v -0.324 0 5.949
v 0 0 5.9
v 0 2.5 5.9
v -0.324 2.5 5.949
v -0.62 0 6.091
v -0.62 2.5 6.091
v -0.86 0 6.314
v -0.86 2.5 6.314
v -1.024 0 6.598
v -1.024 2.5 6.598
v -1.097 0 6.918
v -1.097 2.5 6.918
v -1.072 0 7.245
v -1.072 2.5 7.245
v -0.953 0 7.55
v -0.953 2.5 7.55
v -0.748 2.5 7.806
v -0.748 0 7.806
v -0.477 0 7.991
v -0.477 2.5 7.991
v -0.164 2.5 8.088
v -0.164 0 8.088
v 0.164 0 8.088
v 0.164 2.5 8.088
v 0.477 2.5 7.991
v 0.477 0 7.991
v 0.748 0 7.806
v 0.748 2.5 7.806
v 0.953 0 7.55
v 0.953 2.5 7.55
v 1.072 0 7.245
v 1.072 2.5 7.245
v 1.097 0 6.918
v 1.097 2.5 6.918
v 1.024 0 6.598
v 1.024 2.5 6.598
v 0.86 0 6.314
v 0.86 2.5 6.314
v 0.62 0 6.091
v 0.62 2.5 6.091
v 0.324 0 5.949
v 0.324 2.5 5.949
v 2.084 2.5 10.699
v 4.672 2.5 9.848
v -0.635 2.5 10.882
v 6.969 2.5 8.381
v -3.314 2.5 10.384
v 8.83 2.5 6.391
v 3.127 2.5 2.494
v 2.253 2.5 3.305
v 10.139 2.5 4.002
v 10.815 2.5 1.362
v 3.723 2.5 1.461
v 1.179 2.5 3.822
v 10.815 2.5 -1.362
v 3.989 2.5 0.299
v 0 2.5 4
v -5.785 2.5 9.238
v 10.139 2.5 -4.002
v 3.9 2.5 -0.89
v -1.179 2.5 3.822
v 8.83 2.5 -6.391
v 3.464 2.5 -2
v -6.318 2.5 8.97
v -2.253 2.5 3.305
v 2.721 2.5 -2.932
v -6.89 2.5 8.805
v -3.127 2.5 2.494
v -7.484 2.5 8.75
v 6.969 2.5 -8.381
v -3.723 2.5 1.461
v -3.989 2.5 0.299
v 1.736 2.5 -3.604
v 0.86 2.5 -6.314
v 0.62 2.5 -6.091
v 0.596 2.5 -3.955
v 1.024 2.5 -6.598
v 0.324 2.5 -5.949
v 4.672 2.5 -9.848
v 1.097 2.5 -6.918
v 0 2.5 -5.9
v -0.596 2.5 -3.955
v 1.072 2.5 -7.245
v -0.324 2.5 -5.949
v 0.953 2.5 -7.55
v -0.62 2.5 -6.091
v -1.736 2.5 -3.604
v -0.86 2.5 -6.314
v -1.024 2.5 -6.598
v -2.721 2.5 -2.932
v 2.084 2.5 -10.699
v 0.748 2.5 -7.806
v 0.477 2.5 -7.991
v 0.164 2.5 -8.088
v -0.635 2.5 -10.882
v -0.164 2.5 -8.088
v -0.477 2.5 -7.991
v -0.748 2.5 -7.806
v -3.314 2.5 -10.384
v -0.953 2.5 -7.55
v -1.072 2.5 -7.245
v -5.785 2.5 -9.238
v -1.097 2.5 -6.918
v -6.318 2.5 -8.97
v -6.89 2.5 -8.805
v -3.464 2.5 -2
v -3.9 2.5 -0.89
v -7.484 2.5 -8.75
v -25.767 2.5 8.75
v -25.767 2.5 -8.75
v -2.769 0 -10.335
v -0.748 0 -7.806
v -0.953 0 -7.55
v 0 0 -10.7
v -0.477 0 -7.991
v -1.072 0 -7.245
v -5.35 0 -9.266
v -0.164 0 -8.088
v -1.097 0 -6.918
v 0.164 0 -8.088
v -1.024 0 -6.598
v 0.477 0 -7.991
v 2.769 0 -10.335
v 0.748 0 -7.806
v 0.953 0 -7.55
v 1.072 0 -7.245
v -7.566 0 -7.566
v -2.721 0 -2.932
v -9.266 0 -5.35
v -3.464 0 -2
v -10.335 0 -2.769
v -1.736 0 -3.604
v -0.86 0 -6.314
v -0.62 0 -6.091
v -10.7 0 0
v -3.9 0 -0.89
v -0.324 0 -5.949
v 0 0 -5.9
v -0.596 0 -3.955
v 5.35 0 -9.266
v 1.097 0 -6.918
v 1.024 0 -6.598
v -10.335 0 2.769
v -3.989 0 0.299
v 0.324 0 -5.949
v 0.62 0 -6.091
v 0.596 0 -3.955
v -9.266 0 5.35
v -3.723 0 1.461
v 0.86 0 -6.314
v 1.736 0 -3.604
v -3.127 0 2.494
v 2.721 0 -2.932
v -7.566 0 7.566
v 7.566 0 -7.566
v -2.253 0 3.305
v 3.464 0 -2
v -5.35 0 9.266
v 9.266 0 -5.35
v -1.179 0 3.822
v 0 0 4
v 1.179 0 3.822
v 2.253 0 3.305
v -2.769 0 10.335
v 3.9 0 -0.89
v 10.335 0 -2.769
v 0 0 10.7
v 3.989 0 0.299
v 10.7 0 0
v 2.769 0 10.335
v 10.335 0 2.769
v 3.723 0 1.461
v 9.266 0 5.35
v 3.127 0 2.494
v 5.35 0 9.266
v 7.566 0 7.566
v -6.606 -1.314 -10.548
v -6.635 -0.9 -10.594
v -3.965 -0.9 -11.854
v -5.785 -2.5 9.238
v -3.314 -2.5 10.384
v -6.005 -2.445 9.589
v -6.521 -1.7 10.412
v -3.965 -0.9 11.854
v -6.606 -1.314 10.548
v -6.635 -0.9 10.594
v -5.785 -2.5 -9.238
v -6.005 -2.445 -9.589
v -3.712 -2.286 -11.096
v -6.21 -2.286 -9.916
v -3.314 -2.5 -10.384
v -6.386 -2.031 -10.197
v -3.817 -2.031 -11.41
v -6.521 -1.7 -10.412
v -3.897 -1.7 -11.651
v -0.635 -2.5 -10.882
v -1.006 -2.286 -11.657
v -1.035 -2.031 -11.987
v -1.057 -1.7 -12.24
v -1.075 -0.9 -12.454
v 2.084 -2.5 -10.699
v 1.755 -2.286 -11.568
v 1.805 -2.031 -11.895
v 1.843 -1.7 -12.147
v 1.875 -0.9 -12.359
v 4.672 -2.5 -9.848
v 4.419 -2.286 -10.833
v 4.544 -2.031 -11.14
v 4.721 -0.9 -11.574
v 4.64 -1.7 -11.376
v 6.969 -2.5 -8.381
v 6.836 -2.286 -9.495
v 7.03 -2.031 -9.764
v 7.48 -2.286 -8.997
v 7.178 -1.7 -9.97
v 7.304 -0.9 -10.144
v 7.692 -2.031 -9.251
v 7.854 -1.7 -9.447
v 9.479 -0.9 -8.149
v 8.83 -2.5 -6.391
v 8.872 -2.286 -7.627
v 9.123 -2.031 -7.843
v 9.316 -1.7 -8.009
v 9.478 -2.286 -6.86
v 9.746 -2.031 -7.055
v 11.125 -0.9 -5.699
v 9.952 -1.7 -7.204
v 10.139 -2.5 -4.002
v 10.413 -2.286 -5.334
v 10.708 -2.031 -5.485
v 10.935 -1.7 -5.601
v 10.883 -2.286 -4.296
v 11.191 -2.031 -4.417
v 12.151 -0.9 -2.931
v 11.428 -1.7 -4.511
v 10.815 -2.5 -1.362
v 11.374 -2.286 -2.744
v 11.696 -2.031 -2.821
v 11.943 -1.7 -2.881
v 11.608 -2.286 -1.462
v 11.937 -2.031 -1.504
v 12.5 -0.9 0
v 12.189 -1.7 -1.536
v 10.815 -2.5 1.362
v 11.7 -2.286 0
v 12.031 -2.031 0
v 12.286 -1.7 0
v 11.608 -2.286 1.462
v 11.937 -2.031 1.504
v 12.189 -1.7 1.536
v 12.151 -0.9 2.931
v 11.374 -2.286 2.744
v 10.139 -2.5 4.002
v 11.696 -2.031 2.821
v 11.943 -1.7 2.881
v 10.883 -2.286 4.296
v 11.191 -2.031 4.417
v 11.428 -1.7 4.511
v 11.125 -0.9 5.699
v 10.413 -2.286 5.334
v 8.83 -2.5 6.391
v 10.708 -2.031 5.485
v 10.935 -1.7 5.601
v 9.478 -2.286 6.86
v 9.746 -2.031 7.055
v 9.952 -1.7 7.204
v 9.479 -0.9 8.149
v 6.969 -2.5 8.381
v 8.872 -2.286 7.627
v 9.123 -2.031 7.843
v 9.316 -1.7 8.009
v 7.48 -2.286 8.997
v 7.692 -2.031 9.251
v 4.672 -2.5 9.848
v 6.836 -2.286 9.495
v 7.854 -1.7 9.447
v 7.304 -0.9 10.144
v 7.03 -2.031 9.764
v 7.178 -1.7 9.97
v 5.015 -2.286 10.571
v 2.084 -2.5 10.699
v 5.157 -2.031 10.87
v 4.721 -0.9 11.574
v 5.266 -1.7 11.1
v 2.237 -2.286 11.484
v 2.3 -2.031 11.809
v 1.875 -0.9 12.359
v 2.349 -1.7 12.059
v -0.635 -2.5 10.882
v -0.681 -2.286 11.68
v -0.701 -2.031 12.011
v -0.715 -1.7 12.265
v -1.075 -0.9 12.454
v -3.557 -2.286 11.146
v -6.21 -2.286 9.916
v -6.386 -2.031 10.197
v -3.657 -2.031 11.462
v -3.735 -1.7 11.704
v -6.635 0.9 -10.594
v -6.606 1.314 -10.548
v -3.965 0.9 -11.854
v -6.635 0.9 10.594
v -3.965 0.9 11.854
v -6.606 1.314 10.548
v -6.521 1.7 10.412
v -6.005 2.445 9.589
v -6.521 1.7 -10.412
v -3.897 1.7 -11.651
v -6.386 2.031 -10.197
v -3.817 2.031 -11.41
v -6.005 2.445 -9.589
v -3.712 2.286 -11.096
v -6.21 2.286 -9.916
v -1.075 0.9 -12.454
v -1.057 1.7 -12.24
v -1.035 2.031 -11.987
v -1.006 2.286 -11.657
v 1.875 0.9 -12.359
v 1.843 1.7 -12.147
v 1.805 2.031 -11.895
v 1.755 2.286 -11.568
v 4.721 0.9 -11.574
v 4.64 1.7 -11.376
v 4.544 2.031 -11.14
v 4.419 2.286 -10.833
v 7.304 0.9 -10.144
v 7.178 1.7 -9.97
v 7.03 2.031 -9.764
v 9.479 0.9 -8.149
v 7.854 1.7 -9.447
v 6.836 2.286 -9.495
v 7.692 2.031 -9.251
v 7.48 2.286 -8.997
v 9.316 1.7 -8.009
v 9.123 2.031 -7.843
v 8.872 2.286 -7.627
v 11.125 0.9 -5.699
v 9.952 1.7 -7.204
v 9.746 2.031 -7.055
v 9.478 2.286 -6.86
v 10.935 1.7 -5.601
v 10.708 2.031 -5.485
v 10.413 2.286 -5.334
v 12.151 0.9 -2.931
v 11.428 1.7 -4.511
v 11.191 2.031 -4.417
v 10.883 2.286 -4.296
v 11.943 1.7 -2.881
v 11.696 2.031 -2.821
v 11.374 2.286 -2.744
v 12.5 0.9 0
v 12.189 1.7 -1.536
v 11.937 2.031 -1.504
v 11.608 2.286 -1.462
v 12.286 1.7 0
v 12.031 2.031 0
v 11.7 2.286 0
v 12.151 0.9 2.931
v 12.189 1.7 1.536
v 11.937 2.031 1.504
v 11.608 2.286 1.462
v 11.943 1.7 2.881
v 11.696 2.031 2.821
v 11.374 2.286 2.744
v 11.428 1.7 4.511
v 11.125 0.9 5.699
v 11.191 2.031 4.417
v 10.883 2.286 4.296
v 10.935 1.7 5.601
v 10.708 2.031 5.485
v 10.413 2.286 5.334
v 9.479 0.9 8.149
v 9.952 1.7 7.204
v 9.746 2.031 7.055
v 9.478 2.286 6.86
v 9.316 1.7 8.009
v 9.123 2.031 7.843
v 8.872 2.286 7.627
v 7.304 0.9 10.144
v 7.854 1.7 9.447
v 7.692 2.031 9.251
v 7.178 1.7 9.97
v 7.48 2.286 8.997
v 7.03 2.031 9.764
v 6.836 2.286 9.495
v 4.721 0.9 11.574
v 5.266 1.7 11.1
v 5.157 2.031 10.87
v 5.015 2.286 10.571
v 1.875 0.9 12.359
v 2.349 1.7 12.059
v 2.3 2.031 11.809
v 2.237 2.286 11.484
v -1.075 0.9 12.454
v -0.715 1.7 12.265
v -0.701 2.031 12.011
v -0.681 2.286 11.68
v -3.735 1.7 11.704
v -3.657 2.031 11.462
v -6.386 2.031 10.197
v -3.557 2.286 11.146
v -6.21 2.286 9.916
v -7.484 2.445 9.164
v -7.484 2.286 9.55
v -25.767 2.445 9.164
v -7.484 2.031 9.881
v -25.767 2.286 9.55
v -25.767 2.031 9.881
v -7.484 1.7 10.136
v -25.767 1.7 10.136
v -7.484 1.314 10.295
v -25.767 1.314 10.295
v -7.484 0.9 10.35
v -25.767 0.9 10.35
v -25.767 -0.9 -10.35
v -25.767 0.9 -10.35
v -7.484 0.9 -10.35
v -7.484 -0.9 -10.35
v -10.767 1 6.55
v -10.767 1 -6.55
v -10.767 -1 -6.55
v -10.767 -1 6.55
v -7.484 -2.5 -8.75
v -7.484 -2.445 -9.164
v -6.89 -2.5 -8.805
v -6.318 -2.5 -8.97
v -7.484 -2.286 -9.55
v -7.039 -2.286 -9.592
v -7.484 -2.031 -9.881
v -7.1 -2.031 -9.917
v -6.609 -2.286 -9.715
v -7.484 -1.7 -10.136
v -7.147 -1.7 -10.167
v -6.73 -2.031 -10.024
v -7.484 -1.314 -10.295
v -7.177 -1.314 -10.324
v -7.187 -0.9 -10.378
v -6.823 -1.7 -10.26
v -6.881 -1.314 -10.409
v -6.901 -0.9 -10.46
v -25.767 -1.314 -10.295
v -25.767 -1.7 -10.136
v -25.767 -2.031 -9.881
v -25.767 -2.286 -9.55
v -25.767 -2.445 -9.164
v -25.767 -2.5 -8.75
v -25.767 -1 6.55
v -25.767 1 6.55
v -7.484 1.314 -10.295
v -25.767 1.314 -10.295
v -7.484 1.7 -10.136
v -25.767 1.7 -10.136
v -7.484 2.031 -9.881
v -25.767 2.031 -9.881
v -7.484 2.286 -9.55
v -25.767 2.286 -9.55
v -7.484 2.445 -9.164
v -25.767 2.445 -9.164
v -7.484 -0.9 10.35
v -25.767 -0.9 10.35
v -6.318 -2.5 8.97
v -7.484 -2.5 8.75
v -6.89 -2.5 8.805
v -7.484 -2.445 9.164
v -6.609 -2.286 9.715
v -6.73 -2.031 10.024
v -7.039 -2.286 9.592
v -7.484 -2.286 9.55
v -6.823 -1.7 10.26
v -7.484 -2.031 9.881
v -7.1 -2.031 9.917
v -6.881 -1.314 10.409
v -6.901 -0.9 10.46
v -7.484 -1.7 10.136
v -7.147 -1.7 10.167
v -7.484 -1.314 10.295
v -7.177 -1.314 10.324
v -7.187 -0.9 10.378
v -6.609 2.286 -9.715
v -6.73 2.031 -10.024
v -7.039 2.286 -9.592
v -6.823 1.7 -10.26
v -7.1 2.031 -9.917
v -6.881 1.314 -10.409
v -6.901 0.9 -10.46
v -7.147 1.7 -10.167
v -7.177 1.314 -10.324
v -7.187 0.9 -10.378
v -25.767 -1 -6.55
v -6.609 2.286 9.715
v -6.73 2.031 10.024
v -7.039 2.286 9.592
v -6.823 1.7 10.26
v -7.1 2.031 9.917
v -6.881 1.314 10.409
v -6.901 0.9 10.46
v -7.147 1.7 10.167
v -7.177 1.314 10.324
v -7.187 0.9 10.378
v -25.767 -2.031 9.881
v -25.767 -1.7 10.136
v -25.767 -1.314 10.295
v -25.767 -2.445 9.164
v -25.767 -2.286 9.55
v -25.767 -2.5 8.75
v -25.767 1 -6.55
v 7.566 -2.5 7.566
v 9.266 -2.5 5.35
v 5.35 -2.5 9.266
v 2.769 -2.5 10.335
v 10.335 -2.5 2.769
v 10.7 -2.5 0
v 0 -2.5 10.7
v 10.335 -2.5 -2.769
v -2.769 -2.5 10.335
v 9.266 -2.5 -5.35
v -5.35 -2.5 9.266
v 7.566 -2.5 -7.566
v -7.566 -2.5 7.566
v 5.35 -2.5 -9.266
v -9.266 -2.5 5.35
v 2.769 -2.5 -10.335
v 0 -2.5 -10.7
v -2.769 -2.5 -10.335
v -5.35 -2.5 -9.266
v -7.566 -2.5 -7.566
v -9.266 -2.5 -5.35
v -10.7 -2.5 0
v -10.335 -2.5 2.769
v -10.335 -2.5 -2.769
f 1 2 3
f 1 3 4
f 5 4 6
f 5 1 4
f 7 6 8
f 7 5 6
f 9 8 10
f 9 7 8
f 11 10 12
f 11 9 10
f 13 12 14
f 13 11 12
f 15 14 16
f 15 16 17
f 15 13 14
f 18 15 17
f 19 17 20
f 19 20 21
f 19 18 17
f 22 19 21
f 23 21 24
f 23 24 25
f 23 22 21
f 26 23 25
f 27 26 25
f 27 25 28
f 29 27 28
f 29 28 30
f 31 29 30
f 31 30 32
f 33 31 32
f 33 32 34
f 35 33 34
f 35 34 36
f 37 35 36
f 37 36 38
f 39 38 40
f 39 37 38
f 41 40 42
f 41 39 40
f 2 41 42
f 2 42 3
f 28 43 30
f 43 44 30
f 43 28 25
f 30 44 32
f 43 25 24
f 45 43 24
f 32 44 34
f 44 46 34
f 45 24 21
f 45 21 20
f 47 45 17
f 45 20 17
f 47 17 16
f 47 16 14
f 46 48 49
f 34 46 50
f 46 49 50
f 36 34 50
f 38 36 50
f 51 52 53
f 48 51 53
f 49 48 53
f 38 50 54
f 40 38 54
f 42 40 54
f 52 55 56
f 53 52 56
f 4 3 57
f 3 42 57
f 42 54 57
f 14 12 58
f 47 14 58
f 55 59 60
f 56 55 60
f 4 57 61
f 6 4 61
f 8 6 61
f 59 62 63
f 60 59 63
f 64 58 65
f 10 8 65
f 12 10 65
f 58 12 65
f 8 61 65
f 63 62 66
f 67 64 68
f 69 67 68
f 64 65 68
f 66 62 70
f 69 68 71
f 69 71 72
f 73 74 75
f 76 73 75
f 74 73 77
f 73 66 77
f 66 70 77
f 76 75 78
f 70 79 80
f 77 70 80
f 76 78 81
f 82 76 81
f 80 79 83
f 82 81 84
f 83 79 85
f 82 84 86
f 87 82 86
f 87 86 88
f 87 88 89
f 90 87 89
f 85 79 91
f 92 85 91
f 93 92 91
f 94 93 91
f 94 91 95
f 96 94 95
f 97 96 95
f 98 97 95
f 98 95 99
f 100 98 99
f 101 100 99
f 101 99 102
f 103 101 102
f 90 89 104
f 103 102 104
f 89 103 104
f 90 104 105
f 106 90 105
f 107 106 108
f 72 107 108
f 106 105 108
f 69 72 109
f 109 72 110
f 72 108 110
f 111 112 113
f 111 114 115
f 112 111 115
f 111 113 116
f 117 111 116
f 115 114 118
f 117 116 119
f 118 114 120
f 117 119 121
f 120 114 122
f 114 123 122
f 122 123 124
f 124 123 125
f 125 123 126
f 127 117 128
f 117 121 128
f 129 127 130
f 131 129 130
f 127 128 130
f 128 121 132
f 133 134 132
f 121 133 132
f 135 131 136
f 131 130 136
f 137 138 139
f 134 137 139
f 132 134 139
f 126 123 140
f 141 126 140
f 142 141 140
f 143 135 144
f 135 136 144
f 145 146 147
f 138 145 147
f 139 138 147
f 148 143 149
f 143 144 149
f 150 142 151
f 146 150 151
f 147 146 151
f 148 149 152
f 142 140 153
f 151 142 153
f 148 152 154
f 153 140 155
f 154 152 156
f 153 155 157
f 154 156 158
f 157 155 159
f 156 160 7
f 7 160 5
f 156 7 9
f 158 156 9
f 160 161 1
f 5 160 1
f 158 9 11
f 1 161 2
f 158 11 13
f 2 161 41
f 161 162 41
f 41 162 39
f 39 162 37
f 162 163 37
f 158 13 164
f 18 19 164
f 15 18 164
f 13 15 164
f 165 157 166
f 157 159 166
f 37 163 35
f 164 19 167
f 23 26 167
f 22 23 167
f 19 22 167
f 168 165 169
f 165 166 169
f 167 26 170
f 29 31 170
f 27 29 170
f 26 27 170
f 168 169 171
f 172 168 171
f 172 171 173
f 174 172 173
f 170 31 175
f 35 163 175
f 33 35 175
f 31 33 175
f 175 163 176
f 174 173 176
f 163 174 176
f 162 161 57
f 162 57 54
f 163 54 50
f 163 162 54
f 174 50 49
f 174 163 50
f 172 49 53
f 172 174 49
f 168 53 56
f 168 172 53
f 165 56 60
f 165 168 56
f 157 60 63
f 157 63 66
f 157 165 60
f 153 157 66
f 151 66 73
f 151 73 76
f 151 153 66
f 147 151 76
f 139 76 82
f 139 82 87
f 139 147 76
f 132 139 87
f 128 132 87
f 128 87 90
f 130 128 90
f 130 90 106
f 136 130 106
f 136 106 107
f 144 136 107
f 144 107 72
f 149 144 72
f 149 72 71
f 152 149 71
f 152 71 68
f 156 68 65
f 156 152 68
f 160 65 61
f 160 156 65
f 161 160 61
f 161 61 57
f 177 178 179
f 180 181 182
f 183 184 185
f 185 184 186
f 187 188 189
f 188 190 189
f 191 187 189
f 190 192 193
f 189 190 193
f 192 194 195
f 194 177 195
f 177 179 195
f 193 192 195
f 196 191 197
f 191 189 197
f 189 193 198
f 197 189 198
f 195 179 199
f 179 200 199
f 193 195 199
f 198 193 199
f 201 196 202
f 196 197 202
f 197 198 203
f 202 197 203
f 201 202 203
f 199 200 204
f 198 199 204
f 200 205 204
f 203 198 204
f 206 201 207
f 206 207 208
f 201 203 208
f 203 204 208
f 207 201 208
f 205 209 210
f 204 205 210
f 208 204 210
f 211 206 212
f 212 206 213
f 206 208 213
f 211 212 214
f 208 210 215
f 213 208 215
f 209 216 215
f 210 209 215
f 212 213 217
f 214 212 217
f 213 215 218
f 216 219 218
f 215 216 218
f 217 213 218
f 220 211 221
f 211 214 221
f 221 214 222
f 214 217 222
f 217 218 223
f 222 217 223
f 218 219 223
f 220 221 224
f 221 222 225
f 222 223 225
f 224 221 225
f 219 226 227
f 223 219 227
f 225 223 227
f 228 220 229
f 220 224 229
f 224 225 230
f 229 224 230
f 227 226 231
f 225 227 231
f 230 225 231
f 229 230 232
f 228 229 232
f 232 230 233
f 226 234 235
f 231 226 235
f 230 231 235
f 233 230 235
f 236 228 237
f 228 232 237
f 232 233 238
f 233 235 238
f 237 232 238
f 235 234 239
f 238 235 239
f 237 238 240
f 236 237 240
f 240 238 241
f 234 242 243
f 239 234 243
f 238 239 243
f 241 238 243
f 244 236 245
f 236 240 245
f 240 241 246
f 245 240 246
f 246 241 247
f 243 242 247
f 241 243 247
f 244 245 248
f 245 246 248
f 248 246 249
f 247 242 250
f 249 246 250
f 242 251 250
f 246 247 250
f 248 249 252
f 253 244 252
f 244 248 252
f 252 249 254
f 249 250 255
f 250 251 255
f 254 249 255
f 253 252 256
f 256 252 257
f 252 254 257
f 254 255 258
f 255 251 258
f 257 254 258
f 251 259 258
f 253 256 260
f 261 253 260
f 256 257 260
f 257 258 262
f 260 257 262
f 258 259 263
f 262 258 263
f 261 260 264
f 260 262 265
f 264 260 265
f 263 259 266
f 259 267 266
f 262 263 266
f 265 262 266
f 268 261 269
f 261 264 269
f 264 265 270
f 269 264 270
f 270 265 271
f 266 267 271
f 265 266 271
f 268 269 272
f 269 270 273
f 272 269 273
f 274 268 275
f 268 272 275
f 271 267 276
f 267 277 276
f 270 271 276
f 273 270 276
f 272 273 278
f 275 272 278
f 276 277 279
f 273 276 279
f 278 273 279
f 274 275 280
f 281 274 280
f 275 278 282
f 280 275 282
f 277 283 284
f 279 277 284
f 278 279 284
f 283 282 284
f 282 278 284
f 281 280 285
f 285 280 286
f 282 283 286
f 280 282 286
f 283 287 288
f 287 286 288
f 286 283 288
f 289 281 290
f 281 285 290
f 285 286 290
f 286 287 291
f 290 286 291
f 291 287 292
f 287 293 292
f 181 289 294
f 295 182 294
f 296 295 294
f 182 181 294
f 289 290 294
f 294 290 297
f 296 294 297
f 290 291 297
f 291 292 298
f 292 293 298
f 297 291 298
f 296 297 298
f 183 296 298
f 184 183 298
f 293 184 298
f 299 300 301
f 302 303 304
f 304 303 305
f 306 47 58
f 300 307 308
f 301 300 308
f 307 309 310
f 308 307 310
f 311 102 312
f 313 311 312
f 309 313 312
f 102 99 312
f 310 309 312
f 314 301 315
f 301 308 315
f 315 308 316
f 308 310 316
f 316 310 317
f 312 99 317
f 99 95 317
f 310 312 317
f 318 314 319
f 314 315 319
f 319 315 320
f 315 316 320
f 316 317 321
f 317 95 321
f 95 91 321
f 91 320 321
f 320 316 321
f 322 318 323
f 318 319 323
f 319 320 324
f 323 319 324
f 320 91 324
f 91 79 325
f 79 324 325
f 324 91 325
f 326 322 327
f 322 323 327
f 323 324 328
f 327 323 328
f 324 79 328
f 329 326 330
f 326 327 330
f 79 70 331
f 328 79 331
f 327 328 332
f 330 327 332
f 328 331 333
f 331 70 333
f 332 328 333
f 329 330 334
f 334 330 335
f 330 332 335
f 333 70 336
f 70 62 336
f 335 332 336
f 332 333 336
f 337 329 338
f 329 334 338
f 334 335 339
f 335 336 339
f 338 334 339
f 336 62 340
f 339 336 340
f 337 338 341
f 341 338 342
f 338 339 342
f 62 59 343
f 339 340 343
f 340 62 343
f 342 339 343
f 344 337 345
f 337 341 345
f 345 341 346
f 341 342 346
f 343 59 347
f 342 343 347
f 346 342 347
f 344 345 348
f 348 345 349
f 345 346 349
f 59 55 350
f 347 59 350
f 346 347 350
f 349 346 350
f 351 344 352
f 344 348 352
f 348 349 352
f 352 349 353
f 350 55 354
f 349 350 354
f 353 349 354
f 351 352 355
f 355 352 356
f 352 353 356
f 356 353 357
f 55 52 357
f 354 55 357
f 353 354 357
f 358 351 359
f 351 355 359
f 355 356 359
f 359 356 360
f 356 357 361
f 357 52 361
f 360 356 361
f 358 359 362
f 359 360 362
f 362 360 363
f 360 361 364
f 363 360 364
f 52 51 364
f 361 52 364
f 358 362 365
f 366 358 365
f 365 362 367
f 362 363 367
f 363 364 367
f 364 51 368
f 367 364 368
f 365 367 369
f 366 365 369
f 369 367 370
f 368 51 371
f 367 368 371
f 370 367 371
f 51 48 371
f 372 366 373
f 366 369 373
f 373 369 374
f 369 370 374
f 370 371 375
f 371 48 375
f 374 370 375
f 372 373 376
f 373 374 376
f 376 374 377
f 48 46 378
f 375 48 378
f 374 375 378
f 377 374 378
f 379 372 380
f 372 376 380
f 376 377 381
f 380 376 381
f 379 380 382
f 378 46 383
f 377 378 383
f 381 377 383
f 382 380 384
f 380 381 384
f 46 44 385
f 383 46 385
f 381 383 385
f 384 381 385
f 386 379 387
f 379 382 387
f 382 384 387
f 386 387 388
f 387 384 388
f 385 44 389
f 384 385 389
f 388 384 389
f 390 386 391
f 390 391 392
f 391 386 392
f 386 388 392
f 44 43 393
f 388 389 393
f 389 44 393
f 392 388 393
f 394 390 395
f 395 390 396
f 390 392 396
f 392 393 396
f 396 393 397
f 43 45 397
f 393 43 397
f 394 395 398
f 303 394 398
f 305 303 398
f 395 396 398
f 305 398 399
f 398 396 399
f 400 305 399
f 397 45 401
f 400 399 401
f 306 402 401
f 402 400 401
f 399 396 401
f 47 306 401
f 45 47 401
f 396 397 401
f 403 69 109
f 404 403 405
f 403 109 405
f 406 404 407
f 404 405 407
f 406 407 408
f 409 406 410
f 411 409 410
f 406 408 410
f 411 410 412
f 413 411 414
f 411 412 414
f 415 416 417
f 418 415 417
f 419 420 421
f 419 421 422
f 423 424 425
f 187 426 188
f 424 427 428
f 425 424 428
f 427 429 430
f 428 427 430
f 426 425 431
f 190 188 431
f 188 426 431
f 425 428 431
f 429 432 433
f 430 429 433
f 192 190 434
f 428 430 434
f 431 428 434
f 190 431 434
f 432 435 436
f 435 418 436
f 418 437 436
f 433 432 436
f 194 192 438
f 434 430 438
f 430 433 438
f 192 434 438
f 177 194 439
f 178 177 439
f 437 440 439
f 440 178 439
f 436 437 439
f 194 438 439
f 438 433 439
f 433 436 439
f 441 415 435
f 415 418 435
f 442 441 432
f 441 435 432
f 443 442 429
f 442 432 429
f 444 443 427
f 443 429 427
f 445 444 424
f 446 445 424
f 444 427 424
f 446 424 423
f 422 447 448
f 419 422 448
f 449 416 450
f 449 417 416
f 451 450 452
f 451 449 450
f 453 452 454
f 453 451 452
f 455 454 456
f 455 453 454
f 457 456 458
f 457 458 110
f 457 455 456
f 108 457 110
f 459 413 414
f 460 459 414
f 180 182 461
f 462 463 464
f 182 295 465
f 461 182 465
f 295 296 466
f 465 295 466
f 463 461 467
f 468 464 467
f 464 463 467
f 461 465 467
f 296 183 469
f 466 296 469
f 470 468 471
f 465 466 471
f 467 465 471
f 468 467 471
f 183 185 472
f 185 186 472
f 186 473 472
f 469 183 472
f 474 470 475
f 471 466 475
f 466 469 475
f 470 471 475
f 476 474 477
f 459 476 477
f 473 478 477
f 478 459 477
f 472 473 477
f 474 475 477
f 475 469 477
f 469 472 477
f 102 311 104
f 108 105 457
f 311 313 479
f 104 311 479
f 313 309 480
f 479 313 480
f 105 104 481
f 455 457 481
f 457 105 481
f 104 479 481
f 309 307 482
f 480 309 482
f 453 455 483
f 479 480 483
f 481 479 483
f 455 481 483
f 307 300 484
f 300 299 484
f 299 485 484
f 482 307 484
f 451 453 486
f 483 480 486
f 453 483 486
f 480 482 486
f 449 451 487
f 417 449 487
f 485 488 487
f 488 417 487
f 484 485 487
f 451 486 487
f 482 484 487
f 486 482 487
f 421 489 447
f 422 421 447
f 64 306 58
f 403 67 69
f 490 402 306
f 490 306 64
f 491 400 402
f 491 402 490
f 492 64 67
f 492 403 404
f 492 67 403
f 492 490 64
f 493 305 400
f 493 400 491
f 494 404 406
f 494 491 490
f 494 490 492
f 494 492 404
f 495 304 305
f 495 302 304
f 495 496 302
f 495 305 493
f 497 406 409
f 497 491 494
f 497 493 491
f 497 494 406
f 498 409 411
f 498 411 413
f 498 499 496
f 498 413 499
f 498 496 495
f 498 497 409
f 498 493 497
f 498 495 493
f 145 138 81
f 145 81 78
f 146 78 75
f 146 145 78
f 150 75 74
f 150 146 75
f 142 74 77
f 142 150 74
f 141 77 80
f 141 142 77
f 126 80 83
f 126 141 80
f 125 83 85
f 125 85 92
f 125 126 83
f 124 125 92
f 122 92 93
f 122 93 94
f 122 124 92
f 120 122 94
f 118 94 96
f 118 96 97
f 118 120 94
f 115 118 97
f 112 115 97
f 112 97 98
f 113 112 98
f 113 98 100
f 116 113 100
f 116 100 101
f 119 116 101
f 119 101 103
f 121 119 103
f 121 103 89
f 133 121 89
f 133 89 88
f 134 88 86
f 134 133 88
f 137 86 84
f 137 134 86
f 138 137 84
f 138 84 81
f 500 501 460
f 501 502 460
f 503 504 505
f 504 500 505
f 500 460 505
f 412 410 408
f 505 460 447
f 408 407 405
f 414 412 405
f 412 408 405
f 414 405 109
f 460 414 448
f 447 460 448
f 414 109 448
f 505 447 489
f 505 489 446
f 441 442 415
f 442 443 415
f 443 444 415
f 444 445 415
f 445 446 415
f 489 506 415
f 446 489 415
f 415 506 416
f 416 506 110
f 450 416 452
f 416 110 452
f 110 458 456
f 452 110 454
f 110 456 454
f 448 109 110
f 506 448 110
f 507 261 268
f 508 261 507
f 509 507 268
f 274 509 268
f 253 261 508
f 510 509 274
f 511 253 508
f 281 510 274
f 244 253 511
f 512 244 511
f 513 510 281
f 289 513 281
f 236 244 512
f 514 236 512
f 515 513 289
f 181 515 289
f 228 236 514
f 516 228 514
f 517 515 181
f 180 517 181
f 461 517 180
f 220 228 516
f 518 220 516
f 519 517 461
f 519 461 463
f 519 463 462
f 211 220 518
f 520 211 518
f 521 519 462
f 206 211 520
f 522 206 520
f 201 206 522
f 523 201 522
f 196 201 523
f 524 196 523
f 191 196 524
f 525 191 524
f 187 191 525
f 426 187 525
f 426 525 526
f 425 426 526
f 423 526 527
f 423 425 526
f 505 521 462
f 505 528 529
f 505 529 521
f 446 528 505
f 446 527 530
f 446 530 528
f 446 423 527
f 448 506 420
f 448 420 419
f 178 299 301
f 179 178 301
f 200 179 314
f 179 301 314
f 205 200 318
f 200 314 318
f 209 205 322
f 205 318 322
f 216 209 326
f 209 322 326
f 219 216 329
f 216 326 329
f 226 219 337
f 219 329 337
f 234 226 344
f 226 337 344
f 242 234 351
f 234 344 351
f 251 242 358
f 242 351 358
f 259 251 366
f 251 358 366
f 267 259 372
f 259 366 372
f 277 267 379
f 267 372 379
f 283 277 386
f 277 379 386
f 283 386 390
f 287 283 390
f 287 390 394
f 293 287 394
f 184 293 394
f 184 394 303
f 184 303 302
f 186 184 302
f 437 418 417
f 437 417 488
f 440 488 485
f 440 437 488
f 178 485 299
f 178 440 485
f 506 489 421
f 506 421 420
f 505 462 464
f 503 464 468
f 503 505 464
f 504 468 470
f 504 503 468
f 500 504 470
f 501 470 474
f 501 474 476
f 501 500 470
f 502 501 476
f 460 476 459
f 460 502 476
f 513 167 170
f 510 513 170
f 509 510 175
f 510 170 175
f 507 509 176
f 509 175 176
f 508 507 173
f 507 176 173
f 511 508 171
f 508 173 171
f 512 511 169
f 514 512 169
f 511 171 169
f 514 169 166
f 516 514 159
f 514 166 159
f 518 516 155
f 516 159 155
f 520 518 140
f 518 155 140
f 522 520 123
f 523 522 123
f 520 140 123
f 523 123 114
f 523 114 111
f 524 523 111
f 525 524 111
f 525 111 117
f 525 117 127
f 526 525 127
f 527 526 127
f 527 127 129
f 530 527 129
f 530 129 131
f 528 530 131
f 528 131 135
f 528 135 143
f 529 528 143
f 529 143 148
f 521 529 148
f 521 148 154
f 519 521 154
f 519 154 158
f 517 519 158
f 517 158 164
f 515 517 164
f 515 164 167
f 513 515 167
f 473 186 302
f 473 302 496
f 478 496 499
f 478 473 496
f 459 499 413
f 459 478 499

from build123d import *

# Parameters (mm, degrees)
CROQUIS1_R              = 4
CROQUIS1_R_2            = 1.1
SALIENTE_EXTRUIR1_DEPTH = 2.5
CROQUIS2_W              = 13.1
CROQUIS2_H              = 2
CORTAR_EXTRUIR1_DEPTH   = 15
CORTAR_EXTRUIR2_REACH   = 30.748
CROQUIS3_R              = 10.7
REDONDEO1_R             = 1.6


with BuildPart() as part:
    # Croquis1 → Saliente-Extruir1 (new, symmetric)
    with BuildSketch(Plane(origin=(0, 0, 0), x_dir=(1, 0, 0), z_dir=(0, 1, 0))):
        with BuildLine():
            Line((-25.76696336, 10.35), (-7.009101226, 10.35))
            ThreePointArc((-7.009101226, 10.35), (12.5, 0), (-7.009101226, -10.35))
            Line((-7.009101226, -10.35), (-25.76696336, -10.35))
            Line((-25.76696336, -10.35), (-25.76696336, 10.35))
        make_face()
        with Locations(Location((0, 0, 0), (0, 0, 270))):
            Circle(CROQUIS1_R, mode=Mode.SUBTRACT)
        with Locations(Location((0, 7, 0), (0, 0, 270))):
            Circle(CROQUIS1_R_2, mode=Mode.SUBTRACT)
        with Locations(Location((0, -7, 0), (0, 0, 90))):
            Circle(CROQUIS1_R_2, mode=Mode.SUBTRACT)
    extrude(amount=SALIENTE_EXTRUIR1_DEPTH, both=True)

    # Croquis2 → Cortar-Extruir1 (cut)
    with BuildSketch(Plane.ZY.offset(25.76696336)):
        Rectangle(CROQUIS2_W, CROQUIS2_H)
    extrude(amount=-CORTAR_EXTRUIR1_DEPTH, mode=Mode.SUBTRACT)

    # Croquis3 → Cortar-Extruir2 (cut, up to next)
    with BuildSketch(Plane(origin=(0, 0, 0), x_dir=(1, 0, 0), z_dir=(0, 1, 0)), mode=Mode.PRIVATE) as cortar_extruir2_sk1:
        with Locations(Location((0, 0, 0), (0, 0, 270))):
            Circle(CROQUIS3_R)
    cortar_extruir2_tool1 = extrude(cortar_extruir2_sk1.sketch, amount=-CORTAR_EXTRUIR2_REACH, mode=Mode.PRIVATE) & part.part
    add(cortar_extruir2_tool1.solids().sort_by_distance((0, 0, 0))[0], mode=Mode.SUBTRACT)

    # Redondeo1
    redondeo1_edges = [part.edges().sort_by_distance(p)[0] for p in [
        (12.5, 2.5, 0),
        (-16.388032293, 2.5, -10.35),
        (-16.388032293, -2.5, -10.35),
        (12.5, -2.5, 0),
        (-16.388032293, -2.5, 10.35),
        (-16.388032293, 2.5, 10.35),
        (-7.009101226, 0, -10.35),
        (-7.009101226, 0, 10.35),
    ]]
    fillet(redondeo1_edges, radius=REDONDEO1_R)


solid = part.part
